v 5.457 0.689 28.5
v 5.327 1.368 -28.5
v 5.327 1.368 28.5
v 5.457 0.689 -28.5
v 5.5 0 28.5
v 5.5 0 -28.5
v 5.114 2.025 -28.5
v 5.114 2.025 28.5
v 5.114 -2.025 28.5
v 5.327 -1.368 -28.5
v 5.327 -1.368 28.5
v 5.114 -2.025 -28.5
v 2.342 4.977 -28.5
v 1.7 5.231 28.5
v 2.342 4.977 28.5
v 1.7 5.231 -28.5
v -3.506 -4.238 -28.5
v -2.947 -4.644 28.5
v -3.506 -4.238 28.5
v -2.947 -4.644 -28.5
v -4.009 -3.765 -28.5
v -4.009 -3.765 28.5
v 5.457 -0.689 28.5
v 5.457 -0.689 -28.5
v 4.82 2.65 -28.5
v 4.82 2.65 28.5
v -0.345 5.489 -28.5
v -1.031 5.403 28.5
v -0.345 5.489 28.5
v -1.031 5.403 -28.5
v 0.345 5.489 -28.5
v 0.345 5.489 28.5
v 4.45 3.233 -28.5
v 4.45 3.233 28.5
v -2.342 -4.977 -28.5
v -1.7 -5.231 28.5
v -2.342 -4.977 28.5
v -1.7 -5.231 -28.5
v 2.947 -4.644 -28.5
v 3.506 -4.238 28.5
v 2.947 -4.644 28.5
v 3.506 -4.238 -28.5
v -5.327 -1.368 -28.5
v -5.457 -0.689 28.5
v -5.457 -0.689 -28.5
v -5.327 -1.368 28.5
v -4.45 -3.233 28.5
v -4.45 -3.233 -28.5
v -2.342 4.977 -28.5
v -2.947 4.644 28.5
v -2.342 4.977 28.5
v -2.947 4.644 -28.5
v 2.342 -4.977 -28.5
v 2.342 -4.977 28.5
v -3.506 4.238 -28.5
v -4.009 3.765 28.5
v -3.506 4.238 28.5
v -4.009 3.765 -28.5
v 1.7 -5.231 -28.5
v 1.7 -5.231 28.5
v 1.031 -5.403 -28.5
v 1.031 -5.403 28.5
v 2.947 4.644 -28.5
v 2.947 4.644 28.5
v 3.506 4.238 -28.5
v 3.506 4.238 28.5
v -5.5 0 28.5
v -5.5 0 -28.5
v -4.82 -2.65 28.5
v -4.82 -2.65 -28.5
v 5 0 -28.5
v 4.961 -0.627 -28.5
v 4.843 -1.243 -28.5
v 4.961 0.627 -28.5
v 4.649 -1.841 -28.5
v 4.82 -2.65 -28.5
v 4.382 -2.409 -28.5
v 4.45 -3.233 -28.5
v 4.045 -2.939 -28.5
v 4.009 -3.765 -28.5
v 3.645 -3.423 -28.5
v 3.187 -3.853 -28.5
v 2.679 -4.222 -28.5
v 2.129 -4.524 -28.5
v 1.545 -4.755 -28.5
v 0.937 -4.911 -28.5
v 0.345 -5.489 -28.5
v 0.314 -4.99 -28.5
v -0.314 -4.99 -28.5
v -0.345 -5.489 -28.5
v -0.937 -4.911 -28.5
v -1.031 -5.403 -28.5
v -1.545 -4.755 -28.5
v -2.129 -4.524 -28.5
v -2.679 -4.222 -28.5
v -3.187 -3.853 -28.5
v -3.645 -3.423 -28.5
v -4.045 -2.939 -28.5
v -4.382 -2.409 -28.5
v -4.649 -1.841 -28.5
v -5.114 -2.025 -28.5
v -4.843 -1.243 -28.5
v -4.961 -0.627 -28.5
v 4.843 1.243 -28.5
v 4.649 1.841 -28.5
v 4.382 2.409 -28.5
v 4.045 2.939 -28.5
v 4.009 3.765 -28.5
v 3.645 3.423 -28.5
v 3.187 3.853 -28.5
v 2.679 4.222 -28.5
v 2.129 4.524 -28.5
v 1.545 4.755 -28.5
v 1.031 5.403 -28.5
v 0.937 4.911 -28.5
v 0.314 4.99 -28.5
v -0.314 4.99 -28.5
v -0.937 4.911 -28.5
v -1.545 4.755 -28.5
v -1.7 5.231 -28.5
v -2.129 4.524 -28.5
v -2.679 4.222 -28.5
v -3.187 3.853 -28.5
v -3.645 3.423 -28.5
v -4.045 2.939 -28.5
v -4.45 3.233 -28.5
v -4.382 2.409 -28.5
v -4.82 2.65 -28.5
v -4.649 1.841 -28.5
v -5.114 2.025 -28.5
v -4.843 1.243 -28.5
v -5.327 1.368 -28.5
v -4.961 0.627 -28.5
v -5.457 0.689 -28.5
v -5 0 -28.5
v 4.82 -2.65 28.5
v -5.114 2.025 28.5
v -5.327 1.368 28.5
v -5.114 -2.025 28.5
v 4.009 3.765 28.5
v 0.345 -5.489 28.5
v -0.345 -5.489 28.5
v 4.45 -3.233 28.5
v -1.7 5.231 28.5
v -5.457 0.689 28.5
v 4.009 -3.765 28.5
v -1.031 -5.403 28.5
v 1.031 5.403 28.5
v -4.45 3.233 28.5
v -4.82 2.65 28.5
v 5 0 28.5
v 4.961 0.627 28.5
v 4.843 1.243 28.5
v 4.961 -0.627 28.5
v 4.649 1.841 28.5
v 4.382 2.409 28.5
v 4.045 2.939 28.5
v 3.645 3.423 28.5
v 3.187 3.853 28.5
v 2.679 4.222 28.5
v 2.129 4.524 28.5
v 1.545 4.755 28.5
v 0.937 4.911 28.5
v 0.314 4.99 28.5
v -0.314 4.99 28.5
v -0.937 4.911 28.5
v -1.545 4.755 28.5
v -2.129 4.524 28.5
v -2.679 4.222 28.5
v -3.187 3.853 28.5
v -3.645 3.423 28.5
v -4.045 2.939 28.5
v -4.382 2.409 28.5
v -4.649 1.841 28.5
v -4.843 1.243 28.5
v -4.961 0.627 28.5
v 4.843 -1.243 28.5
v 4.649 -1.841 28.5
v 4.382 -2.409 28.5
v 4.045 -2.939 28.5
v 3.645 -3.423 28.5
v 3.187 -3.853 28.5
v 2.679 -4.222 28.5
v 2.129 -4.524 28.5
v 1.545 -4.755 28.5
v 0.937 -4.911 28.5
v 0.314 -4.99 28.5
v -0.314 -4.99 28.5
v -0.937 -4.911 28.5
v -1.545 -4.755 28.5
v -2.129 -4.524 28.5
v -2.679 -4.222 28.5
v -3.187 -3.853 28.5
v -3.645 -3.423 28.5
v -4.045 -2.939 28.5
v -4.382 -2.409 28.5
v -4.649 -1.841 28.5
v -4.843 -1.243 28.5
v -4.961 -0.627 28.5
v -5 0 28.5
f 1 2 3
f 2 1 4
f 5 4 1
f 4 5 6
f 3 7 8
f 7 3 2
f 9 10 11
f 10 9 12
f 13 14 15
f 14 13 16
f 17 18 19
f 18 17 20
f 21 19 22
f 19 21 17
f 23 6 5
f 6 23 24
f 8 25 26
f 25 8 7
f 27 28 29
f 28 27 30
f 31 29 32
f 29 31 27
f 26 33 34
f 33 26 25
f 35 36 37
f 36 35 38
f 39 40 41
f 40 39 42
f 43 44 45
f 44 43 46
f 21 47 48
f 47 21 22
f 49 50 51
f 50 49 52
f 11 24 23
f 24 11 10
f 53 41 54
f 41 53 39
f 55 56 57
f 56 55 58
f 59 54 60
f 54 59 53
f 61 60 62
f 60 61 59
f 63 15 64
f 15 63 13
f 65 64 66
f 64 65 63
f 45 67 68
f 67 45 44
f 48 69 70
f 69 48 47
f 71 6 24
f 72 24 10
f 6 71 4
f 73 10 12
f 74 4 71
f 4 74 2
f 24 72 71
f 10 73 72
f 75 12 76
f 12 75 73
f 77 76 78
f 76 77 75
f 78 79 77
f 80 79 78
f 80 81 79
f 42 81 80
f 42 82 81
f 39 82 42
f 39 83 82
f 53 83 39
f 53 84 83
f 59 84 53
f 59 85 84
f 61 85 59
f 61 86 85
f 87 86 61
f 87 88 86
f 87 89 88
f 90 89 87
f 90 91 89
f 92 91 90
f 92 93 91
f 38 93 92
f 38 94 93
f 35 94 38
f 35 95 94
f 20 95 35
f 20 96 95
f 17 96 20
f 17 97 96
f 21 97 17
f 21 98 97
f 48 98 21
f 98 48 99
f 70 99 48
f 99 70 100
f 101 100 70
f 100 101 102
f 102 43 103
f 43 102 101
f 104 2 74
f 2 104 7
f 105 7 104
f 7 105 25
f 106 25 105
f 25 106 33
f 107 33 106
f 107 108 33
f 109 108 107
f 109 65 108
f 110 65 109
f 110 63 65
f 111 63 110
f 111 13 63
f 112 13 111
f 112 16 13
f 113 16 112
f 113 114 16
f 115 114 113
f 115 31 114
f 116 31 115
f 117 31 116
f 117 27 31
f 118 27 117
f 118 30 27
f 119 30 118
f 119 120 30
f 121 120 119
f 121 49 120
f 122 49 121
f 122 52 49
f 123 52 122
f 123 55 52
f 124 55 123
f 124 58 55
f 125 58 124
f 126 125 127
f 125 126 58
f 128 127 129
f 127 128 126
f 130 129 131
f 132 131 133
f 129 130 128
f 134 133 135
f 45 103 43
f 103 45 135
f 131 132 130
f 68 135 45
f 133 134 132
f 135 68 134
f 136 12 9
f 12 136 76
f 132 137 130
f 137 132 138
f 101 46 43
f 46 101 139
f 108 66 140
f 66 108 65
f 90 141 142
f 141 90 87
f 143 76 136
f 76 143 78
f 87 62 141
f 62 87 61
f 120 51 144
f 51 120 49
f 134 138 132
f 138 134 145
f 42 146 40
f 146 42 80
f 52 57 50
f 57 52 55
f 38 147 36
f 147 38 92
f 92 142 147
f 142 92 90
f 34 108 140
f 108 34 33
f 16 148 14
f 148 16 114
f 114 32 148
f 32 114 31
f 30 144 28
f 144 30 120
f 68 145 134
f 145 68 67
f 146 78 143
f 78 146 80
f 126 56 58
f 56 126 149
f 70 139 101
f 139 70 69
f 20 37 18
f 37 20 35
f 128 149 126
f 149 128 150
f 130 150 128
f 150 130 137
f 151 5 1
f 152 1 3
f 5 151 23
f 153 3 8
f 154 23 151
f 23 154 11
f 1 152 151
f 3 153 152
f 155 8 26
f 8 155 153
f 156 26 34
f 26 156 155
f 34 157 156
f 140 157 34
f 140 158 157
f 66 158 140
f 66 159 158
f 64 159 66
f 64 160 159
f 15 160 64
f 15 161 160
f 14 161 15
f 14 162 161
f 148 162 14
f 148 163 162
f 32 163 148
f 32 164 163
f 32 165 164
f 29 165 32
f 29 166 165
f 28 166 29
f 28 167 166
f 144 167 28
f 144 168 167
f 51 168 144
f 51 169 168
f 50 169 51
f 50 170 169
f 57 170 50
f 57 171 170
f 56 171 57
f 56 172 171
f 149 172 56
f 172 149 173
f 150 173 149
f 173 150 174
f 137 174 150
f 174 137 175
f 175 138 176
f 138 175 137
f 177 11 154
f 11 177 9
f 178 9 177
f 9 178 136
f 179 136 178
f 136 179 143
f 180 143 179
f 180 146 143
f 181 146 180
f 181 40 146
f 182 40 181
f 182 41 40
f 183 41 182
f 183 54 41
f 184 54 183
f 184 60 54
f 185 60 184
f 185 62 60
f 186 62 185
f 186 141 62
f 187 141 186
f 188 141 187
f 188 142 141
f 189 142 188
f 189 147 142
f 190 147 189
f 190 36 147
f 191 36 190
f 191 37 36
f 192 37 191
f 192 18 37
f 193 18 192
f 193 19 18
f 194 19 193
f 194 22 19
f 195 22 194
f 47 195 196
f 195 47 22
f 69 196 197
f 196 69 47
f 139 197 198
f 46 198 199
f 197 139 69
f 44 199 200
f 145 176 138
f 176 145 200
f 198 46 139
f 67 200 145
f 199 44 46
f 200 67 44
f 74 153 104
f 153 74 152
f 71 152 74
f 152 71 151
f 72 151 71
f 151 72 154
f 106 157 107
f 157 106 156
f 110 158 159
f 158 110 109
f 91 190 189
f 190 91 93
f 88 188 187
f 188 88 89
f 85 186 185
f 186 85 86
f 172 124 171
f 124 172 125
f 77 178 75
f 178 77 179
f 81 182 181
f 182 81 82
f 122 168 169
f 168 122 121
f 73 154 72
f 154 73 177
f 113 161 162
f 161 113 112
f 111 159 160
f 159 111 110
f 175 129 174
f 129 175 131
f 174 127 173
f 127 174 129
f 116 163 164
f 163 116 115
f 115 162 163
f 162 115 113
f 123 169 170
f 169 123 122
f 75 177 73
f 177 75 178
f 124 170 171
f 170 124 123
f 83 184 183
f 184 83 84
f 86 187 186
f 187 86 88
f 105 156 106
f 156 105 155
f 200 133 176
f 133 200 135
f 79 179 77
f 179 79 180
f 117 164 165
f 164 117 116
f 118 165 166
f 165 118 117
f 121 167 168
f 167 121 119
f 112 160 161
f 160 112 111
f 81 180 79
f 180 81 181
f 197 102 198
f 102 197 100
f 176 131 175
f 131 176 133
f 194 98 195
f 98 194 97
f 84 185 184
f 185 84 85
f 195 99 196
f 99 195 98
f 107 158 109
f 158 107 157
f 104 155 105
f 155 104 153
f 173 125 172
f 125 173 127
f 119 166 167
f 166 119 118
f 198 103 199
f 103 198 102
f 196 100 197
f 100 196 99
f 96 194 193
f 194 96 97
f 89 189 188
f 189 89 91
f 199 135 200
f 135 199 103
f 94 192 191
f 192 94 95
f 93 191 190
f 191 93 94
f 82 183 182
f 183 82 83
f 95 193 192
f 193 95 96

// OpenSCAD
$fn = 50;


difference() {
	union() {
		translate(v = [0, 0, -28.5000000000]) {
			cylinder(h = 57, r = 5.5000000000);
		}
	}
	union() {
		translate(v = [0, 0, -100.0000000000]) {
			cylinder(h = 200, r = 5.0000000000);
		}
	}
}
